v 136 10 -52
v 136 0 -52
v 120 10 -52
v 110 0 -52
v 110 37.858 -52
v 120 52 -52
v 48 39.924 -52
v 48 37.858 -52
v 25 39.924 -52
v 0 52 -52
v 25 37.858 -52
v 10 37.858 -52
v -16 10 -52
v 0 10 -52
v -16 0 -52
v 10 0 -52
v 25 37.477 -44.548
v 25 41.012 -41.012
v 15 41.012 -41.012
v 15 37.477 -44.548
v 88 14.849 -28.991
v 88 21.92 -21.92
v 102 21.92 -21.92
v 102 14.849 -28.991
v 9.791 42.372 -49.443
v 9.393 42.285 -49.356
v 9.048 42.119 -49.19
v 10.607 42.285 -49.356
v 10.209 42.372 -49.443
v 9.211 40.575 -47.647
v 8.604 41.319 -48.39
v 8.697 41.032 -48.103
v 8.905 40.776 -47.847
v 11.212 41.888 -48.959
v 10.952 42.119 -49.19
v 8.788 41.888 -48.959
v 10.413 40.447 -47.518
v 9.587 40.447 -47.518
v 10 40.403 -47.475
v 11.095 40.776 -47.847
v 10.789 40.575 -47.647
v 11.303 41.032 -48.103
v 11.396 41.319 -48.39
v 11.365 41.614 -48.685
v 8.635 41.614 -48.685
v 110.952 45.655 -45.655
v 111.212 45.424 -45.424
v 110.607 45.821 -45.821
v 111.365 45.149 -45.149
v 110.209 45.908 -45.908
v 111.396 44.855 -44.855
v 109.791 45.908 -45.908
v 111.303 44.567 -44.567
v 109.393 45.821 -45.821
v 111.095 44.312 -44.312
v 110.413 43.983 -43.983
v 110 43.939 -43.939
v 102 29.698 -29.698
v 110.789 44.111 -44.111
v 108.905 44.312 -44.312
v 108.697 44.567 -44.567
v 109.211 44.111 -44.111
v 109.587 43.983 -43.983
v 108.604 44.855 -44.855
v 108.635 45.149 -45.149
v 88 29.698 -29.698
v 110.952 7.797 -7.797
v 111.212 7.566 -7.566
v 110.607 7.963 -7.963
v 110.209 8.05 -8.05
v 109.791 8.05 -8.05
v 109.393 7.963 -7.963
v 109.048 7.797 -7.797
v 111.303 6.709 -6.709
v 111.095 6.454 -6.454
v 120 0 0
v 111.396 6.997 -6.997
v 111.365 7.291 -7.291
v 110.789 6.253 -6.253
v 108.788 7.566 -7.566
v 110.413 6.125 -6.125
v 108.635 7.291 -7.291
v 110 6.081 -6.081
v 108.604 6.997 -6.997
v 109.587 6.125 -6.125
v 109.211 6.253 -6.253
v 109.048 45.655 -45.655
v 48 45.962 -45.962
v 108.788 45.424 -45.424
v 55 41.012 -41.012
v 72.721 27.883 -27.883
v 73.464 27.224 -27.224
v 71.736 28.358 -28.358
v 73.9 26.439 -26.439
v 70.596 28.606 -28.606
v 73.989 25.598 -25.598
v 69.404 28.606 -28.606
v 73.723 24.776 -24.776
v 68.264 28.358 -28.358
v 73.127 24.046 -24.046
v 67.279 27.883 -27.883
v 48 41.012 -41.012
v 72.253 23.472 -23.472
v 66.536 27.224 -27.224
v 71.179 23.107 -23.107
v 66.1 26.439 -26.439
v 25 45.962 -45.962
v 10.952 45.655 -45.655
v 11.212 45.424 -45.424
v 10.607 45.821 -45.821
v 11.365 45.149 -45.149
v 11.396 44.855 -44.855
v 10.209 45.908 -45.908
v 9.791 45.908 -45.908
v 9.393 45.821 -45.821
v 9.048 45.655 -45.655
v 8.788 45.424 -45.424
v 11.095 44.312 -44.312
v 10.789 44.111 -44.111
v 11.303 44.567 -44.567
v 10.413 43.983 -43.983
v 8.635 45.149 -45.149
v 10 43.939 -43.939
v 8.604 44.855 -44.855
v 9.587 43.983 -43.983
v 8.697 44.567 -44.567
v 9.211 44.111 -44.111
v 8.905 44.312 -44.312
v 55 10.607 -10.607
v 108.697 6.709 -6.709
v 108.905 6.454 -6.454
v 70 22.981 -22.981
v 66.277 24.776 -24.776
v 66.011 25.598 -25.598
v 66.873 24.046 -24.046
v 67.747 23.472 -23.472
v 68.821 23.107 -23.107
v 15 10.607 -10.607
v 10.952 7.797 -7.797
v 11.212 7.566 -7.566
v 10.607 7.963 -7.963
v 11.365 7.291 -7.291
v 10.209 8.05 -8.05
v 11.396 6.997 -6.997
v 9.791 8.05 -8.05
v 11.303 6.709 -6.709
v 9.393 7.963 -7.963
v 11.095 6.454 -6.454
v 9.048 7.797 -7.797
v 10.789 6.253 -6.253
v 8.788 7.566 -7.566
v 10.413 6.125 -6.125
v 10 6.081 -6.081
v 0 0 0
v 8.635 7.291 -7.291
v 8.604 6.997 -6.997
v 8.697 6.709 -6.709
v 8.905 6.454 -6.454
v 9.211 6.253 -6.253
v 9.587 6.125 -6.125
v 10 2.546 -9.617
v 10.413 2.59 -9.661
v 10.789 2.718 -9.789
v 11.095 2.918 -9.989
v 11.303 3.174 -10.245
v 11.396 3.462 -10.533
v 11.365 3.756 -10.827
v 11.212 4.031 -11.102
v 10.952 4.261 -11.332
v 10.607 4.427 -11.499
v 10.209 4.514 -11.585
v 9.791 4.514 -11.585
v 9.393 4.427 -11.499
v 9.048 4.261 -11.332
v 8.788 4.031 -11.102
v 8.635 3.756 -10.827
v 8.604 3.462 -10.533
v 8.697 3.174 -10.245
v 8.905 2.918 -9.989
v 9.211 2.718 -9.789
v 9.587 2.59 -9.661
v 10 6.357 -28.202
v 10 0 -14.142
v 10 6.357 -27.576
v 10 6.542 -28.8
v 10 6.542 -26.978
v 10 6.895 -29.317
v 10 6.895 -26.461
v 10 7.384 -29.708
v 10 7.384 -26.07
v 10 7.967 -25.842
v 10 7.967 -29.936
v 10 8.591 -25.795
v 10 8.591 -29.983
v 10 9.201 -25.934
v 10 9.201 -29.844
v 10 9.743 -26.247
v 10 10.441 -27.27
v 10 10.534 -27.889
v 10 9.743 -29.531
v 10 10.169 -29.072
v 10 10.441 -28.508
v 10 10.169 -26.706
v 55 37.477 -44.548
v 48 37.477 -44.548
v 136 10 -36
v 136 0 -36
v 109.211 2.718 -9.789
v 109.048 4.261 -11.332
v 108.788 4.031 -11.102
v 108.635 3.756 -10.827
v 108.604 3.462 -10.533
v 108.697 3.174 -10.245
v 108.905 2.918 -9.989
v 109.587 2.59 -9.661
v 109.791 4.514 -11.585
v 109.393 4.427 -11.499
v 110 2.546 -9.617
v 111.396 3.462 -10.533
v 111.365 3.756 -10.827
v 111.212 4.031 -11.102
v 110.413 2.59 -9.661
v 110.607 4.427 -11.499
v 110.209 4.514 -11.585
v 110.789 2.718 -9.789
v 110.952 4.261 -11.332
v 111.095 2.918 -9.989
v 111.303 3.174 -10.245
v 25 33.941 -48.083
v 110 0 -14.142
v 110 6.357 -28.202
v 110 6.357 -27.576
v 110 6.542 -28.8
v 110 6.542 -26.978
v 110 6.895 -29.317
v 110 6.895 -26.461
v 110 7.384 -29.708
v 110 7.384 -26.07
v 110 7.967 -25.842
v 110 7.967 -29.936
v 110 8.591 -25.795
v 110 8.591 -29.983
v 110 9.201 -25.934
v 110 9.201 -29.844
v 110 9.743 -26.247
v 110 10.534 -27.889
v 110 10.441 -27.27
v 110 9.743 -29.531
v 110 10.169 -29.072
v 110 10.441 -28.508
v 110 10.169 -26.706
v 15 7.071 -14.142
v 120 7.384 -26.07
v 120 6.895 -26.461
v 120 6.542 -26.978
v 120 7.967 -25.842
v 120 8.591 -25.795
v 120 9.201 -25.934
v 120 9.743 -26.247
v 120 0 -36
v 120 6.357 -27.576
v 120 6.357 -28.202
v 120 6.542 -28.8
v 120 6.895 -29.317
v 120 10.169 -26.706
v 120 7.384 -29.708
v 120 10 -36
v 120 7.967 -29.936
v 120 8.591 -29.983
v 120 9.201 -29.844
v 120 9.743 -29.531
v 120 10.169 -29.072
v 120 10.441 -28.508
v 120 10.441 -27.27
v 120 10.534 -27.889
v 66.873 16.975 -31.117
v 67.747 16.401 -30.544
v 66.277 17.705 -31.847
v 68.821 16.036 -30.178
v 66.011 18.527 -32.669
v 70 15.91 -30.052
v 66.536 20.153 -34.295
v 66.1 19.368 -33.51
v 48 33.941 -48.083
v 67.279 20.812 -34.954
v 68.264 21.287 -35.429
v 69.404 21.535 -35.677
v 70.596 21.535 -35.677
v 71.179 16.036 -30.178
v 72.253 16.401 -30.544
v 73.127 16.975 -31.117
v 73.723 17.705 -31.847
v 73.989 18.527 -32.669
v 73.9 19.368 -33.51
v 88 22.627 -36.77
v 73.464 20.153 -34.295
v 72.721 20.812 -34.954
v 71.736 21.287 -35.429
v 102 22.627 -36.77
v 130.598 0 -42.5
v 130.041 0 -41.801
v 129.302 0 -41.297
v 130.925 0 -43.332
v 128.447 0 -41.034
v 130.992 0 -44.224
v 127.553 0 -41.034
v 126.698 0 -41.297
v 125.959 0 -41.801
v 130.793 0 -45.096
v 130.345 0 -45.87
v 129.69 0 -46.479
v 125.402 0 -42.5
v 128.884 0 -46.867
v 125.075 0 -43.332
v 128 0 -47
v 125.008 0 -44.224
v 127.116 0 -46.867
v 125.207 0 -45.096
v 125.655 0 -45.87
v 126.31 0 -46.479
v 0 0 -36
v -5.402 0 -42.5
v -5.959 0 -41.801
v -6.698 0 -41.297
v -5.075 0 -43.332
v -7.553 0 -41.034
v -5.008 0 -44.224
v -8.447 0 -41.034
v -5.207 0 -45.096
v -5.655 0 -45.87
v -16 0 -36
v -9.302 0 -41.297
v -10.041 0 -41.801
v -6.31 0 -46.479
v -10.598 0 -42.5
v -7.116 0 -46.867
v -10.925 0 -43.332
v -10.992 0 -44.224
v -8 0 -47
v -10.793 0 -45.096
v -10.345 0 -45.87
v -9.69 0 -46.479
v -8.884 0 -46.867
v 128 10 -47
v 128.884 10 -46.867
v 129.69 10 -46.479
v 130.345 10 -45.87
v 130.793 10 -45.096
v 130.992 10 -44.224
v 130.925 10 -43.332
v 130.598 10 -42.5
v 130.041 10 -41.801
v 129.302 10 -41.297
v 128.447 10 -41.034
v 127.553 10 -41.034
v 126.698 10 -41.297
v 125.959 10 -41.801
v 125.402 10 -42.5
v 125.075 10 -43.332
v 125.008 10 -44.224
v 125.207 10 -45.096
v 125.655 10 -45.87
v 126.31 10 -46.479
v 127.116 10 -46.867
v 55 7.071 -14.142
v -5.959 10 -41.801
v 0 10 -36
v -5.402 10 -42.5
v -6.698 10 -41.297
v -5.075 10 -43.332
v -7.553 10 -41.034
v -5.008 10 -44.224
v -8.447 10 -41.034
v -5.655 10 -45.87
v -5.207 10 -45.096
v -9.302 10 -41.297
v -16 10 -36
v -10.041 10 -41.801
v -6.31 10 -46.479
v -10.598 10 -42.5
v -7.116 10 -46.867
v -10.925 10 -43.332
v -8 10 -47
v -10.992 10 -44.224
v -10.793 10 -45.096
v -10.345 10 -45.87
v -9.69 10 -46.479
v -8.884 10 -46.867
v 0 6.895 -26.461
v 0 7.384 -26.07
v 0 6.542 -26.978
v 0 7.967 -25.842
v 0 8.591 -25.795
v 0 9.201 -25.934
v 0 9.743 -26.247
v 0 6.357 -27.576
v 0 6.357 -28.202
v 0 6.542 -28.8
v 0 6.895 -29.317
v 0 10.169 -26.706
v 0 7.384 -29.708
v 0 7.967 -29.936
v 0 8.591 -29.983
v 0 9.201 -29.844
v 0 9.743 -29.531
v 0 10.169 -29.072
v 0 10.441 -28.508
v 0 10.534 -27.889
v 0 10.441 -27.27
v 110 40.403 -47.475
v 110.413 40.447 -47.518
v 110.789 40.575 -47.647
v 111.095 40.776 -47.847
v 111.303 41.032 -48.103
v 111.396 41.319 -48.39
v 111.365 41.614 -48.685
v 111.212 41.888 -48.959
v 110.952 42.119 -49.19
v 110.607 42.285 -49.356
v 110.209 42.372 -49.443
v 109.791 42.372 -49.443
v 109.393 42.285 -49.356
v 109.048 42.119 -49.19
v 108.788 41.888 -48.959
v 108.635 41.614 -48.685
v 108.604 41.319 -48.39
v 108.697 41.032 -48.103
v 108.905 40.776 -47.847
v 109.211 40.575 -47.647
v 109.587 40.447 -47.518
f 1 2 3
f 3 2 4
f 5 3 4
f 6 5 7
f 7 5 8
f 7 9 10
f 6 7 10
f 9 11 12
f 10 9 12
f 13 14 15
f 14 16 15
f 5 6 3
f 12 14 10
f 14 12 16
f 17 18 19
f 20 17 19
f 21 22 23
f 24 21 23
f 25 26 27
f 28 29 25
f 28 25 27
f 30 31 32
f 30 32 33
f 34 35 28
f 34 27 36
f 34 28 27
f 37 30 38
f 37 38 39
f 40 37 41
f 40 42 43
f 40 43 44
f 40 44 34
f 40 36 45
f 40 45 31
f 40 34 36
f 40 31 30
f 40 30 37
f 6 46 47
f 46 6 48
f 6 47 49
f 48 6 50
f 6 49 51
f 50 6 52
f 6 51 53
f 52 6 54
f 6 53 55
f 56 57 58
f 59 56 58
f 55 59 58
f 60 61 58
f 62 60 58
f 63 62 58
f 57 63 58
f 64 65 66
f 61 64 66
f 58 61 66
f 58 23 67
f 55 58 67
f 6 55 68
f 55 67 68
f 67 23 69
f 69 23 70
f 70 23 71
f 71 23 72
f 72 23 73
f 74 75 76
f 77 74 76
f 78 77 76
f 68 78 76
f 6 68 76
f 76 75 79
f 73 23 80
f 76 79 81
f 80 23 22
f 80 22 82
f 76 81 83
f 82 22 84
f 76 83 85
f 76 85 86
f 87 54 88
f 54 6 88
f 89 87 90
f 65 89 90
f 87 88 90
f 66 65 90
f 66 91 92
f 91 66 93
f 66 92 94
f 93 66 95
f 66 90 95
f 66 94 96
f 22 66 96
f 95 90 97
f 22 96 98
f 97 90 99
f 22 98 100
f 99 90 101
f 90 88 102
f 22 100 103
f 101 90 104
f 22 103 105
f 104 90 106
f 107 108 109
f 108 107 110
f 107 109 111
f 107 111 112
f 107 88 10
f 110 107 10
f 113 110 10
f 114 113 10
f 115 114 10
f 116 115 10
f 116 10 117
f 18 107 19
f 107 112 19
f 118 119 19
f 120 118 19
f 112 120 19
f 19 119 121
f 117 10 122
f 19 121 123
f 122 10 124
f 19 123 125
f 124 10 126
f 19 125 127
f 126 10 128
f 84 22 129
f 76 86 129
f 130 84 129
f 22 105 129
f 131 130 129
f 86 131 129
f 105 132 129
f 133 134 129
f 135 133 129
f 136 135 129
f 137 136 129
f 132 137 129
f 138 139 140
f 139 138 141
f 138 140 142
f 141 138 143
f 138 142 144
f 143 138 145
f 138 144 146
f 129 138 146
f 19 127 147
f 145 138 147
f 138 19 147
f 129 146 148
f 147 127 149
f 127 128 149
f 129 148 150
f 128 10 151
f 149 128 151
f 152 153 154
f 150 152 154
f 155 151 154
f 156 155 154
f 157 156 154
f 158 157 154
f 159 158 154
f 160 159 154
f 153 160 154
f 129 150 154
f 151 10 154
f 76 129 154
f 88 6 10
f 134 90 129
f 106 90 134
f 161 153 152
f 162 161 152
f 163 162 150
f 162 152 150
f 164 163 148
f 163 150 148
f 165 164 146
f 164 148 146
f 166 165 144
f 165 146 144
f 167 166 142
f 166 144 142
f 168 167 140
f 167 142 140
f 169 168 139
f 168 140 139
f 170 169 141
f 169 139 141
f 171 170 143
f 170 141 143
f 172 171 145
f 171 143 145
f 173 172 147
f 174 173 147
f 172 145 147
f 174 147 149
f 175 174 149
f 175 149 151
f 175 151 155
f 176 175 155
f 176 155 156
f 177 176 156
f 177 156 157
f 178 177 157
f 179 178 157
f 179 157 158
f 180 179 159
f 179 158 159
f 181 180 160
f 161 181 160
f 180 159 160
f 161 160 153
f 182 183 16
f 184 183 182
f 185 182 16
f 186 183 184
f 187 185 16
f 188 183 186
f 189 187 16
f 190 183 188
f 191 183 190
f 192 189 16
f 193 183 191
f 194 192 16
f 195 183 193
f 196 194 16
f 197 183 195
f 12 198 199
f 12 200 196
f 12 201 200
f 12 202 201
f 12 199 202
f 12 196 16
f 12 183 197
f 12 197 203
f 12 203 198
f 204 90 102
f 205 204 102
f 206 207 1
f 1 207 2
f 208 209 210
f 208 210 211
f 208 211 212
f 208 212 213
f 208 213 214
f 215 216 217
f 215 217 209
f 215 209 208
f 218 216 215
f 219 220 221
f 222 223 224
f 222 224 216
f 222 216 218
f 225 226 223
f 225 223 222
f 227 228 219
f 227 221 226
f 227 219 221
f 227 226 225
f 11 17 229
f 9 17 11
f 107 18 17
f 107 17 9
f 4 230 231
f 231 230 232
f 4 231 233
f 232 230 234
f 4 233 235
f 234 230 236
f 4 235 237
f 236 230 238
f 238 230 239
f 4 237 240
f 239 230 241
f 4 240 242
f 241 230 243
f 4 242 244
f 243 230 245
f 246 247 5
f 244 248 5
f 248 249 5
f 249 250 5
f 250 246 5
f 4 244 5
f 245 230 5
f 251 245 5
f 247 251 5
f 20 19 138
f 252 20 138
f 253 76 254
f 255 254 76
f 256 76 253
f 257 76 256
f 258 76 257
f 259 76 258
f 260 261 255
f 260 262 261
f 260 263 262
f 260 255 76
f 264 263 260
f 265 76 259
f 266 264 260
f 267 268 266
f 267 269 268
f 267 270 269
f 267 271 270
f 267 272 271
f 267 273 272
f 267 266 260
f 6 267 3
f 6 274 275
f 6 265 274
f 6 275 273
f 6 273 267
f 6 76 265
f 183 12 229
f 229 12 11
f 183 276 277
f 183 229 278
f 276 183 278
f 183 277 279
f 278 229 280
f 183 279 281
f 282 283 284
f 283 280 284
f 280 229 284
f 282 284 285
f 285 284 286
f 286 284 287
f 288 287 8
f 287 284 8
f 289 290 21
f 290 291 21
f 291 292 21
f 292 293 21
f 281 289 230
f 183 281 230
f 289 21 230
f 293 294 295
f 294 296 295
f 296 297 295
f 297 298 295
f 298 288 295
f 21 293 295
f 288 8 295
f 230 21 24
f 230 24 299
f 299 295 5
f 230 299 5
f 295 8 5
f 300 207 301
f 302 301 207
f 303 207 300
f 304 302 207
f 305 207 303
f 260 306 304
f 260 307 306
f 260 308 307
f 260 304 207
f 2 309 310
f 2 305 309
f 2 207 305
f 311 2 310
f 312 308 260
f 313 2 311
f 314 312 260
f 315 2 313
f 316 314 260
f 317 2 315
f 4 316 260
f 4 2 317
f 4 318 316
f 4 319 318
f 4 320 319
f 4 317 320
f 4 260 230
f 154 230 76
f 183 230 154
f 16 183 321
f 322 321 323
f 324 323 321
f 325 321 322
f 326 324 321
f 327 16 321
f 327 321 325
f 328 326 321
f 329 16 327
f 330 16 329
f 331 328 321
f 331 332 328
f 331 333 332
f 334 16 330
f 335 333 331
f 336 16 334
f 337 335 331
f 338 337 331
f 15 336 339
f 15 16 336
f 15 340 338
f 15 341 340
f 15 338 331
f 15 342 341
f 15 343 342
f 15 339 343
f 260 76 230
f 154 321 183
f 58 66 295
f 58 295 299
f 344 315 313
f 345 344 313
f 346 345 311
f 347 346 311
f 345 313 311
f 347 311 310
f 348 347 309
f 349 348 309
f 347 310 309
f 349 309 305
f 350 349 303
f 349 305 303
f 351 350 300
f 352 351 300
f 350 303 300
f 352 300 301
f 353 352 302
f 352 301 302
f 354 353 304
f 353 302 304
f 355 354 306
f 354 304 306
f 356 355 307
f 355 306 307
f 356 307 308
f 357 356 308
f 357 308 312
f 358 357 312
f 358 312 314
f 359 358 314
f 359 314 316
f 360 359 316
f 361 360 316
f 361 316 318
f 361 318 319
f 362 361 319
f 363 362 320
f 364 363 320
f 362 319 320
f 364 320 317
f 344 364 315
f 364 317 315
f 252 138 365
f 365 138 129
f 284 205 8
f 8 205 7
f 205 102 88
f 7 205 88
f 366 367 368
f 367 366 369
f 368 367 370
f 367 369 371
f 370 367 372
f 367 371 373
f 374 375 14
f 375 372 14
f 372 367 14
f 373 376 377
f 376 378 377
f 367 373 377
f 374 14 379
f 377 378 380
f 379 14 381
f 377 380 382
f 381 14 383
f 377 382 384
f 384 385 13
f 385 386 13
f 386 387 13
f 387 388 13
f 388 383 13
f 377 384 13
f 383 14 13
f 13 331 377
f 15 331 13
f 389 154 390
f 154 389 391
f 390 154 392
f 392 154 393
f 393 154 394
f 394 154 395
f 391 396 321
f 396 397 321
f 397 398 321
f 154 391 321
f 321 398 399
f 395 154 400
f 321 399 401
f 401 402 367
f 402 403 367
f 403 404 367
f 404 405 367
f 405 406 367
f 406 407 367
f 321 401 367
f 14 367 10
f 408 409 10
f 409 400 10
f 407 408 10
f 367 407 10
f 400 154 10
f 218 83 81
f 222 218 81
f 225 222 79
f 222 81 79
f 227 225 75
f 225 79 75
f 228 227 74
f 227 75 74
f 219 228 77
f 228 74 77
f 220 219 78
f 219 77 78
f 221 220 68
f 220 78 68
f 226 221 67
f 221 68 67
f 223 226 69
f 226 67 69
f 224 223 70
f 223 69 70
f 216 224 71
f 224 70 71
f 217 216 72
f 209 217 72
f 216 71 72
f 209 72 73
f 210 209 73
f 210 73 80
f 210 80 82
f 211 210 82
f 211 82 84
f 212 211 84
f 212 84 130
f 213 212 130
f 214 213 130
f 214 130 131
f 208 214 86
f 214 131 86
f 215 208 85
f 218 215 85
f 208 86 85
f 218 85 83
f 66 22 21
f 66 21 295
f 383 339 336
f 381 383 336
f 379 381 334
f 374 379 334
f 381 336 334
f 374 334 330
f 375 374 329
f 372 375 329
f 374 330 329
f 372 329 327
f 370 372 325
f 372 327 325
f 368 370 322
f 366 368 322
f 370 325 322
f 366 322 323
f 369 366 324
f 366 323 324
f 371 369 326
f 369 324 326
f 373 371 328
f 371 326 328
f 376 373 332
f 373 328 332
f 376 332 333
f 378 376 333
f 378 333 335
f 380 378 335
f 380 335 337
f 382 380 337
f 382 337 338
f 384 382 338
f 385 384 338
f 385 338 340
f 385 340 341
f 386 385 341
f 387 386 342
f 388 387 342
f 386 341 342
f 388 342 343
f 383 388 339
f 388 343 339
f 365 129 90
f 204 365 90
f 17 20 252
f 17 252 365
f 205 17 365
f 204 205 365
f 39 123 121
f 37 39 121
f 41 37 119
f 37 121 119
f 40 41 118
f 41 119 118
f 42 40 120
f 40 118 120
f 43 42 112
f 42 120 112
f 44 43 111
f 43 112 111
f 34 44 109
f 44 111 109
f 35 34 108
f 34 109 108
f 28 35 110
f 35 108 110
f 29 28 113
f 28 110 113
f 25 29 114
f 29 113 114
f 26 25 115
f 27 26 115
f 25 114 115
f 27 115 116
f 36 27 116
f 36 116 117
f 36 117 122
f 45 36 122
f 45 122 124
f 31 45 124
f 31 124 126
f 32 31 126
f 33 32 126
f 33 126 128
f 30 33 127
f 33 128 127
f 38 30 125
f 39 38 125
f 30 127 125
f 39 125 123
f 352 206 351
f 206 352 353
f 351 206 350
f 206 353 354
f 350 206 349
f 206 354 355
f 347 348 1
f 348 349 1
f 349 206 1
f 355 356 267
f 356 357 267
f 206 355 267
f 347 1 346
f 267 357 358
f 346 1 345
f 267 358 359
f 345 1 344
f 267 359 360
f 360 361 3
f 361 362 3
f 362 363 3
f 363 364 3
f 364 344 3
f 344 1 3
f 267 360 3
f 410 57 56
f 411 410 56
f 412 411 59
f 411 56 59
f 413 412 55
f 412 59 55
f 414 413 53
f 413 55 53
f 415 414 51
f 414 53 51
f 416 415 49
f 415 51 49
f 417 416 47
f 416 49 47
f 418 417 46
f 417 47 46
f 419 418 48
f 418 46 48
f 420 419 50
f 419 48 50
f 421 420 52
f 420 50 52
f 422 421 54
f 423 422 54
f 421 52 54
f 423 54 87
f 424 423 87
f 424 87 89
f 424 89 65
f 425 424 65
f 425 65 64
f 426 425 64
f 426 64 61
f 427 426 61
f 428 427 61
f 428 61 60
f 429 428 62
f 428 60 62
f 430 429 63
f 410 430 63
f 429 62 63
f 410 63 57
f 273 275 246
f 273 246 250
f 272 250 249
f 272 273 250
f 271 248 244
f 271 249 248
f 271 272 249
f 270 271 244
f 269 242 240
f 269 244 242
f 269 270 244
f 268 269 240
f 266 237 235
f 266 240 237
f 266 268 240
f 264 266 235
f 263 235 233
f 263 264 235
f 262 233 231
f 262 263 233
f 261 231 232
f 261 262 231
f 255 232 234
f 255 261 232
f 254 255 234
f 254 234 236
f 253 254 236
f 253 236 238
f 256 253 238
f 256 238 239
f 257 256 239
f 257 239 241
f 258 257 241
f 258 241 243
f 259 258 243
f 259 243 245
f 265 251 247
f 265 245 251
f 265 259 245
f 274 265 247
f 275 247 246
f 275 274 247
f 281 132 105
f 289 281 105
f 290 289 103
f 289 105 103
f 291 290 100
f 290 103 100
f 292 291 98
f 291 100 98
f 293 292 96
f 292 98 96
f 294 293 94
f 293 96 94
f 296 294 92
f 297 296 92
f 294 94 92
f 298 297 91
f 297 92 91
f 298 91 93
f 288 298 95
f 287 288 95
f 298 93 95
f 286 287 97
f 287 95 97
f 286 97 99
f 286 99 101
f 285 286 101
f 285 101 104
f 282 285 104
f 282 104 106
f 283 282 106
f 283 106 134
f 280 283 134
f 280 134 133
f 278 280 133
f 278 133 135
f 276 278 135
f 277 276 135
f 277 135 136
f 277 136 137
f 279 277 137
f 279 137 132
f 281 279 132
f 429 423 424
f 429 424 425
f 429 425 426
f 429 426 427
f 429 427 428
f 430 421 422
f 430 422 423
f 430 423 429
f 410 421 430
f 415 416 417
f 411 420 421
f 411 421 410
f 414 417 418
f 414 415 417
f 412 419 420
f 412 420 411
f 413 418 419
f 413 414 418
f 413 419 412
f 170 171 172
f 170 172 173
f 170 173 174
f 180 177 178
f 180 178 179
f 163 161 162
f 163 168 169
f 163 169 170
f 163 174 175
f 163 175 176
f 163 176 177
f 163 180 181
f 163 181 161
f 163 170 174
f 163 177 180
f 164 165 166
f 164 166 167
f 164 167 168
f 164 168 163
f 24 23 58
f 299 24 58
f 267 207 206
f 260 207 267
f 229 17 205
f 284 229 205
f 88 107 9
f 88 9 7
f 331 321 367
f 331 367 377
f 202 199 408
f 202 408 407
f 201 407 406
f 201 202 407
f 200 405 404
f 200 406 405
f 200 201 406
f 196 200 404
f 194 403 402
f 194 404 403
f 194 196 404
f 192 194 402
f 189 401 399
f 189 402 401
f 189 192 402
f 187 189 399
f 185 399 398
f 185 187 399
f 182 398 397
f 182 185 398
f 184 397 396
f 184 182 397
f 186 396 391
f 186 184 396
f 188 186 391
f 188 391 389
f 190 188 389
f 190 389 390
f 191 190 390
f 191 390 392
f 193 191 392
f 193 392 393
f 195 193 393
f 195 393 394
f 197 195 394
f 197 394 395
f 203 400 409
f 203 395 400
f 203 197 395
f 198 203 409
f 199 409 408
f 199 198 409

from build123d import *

# Parameters (mm, degrees)
EXTRUDE_3_DEPTH          = 120
SKETCH_4_R               = 4
SKETCH_4_W               = 14
SKETCH_4_H               = 11
CUT_EXTRUDE_1_DEPTH      = 120
CUT_EXTRUDE_2_DEPTH      = 5
SKETCH_5_W               = 23
SKETCH_5_H               = 7
CUT_EXTRUDE_3_DEPTH      = 98
SKETCH_6_W               = 100
SKETCH_6_H               = 53.539105243
CUT_EXTRUDE_4_DEPTH      = 98
SKETCH_7_R               = 1.4
CUT_EXTRUDE_5_DEPTH      = 5
SKETCH_13_W              = 16
SKETCH_13_H              = 16
SKETCH_13_R              = 3
EXTRUDE_8_DEPTH          = 10
CUT_EXTRUDE_7_DEPTH      = 155.609184721
CUT_EXTRUDE_7_DEPTH_BACK = 155.609184721
SKETCH_15_R              = 2.1


with BuildPart() as part:
    # Эскиз3 → Бобышка-Вытянуть3 (new body)
    with BuildSketch(Plane(origin=(0, 0, 0), x_dir=(0, 0, -1), z_dir=(1, 0, 0))):
        Polygon((0, 0), (52, 0), (52, 52), align=None)
    extrude(amount=EXTRUDE_3_DEPTH)

    # Эскиз4 → Вырез-Вытянуть1 (cut)
    with BuildSketch(Plane(origin=(0, 0, 0), x_dir=(1, 0, 0), z_dir=(0, 0.7071067811865477, 0.7071067811865475))):
        with Locations(Location((70, 36.5, 0), (0, 0, 270))):
            Circle(SKETCH_4_R)
        with Locations((95, 36.5)):
            Rectangle(SKETCH_4_W, SKETCH_4_H)
    extrude(amount=-CUT_EXTRUDE_1_DEPTH, mode=Mode.SUBTRACT)

    # Эскиз4<3> → Вырез-Вытянуть2 (cut)
    with BuildSketch(Plane(origin=(0, 0, 0), x_dir=(1, 0, 0), z_dir=(0, 0.7071067811865477, 0.7071067811865475))):
        Polygon((48, 58), (48, 65), (25, 65), (25, 58), (15, 58), (15, 15), (55, 15), (55, 58), align=None)
    extrude(amount=-CUT_EXTRUDE_2_DEPTH, mode=Mode.SUBTRACT)

    # Эскиз5 → Вырез-Вытянуть3 (cut)
    with BuildSketch(Plane(origin=(0, -3.535533906, -3.535533906), x_dir=(1, 0, 0), z_dir=(0, 0.7071067811865477, 0.7071067811865474))):
        with Locations((36.5, 61.5)):
            Rectangle(SKETCH_5_W, SKETCH_5_H)
    extrude(amount=-CUT_EXTRUDE_3_DEPTH, mode=Mode.SUBTRACT)

    # Эскиз6 → Вырез-Вытянуть4 (cut)
    with BuildSketch(Plane(origin=(0, -7.071067812, -7.071067812), x_dir=(1, 0, 0), z_dir=(0, 0.7071067811865477, 0.7071067811865474))):
        with Locations((60, 36.769552621)):
            Rectangle(SKETCH_6_W, SKETCH_6_H)
    extrude(amount=-CUT_EXTRUDE_4_DEPTH, mode=Mode.SUBTRACT)

    # Эскиз7 → Вырез-Вытянуть5 (cut)
    with BuildSketch(Plane(origin=(0, 0, 0), x_dir=(1, 0, 0), z_dir=(0, 0.7071067811865477, 0.7071067811865475))):
        with Locations(Location((10, 63.539105243, 0), (0, 0, 270))):
            Circle(SKETCH_7_R)
        with Locations(Location((110, 10, 0), (0, 0, 270))):
            Circle(SKETCH_7_R)
        with Locations(Location((110, 63.539105243, 0), (0, 0, 270))):
            Circle(SKETCH_7_R)
        with Locations(Location((10, 10, 0), (0, 0, 270))):
            Circle(SKETCH_7_R)
    extrude(amount=-CUT_EXTRUDE_5_DEPTH, mode=Mode.SUBTRACT)

    # Эскиз13 → Бобышка-Вытянуть8 (add)
    # profile 1 of 2: a face of its own
    with BuildSketch(Plane(origin=(0, 0, 0), x_dir=(-1, 0, 0), z_dir=(0, -1, 0))):
        with Locations((-128, 44)):
            Rectangle(SKETCH_13_W, SKETCH_13_H)
        with Locations(Location((-128, 44, 0), (0, 0, 90))):
            Circle(SKETCH_13_R, mode=Mode.SUBTRACT)
    # profile 2 of 2: a face of its own
    with BuildSketch(Plane(origin=(0, 0, 0), x_dir=(-1, 0, 0), z_dir=(0, -1, 0))):
        with Locations((8, 44)):
            Rectangle(SKETCH_13_W, SKETCH_13_H)
        with Locations(Location((8, 44, 0), (0, 0, 90))):
            Circle(SKETCH_13_R, mode=Mode.SUBTRACT)
    extrude(amount=-EXTRUDE_8_DEPTH)

    # Эскиз15 → Вырез-Вытянуть7 (cut, two sides: drawn at the far end of the back side and taken through both)
    with BuildSketch(Plane.ZY.offset(-CUT_EXTRUDE_7_DEPTH_BACK)):
        with Locations(Location((-27.888881523, 8.434002899, 0), (0, 0, 90))):
            Circle(SKETCH_15_R)
    extrude(amount=CUT_EXTRUDE_7_DEPTH + CUT_EXTRUDE_7_DEPTH_BACK, mode=Mode.SUBTRACT)


solid = part.part
